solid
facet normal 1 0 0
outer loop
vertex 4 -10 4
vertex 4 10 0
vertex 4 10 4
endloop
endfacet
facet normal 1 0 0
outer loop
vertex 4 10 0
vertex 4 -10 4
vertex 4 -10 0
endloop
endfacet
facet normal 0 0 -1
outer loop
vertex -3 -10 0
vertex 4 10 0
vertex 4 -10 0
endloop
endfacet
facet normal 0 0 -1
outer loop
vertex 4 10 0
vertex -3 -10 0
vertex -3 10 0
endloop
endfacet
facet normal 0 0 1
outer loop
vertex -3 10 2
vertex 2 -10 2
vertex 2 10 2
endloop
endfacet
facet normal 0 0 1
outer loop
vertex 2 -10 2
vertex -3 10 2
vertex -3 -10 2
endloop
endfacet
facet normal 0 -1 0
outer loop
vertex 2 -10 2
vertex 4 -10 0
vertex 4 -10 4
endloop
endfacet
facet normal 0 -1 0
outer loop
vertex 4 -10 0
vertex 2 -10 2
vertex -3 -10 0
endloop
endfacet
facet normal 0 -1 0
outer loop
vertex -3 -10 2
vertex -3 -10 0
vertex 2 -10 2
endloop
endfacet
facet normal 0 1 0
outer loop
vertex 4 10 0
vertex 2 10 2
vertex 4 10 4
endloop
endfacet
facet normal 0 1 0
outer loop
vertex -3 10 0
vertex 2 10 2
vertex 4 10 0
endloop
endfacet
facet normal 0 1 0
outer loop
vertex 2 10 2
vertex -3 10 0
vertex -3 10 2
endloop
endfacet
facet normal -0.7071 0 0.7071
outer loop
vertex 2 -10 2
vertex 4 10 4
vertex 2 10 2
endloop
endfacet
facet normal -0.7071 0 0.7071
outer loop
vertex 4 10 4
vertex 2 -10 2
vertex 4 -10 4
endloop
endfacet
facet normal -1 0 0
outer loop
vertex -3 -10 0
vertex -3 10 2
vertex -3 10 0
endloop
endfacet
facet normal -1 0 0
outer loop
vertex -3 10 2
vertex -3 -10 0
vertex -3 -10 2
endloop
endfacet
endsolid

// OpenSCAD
module clip_holder(depth = 20, wall_thickness = 2, tolerance = 0.2) {
    // hanger
    translate([0, 0, -wall_thickness]) {
      cube(size=[wall_thickness * 1.5, depth, wall_thickness]);
    }
  
    translate([wall_thickness * 0.5, 0, 0]) {
      // clip
      translate([0, 0, -wall_thickness*2]) {
        translate([0, depth, 0]) {
          rotate(90, [1, 0, 0]) {
            linear_extrude(height=depth) {
                polygon(points=[[wall_thickness,0],[0, wall_thickness],[wall_thickness,wall_thickness]], paths=[[0,1,2]]);
            }
          }
        }
      }
    }
}

module clip_holder_mount_notches(depth = 20, height = 10, wall_thickness = 2, tolerance = 0.2) {
  union() {
    // right
    translate([wall_thickness, 0, -height / 2]) {
      rotate(45, [0, 0, 1]) {
        cube(size=[wall_thickness + tolerance, wall_thickness + tolerance, height + 0.2], center=true);
      }
    }

    // left
    translate([wall_thickness, depth, -height / 2]) {
      rotate(45, [0, 0, 1]) {
        cube(size=[wall_thickness + tolerance, wall_thickness + tolerance, height + 0.2], center=true);
      }
    }

    // bottom
    translate([wall_thickness, depth / 2, -height]) {
      rotate(45, [0, 1, 0]) {
        cube(size=[wall_thickness + tolerance, depth + 0.2, wall_thickness + tolerance], center=true);
      }
    }
  }
}


module clip_holder_mount(depth = 20, height = 10, wall_thickness = 2) {
  translate([0, 0, -height]) {
    cube(size=[(wall_thickness + wall_thickness), depth, height]);
  }
}

module wall_mounted_clip_holder (depth = 20, height = 10, wall_thickness = 2, tolerance = 0.2) {
  translate([-wall_thickness * 1.5, -depth / 2, 0]) {
    difference() {
      union() {
        clip_holder_mount(depth, height, wall_thickness);
        translate([wall_thickness * 2, 0, 0]) {
          clip_holder(depth, wall_thickness, tolerance);
        }
      }

      clip_holder_mount_notches(depth, height, wall_thickness, tolerance);
    }
  }
}

module base_mounted_clip_holder (depth = 20, wall_thickness = 2, tolerance = 0.2) {
  translate([-wall_thickness * 1.5, depth / 2, 0]) {
    rotate(180, [1, 0, 0]) {
      union() {
        clip_holder_mount(depth, wall_thickness, wall_thickness);
        translate([wall_thickness * 2, 0, 0]) {
          clip_holder(depth, wall_thickness, tolerance);
        }
      }  
    }
  }
}

module wall_mount_hole (depth = 20, height = 10, wall_thickness = 2, tolerance = 0.2) {

  translate([-wall_thickness * 1.5, -depth / 2, tolerance]) {
    difference() {
      union() {
        clip_holder_mount(depth, height + tolerance, wall_thickness);
      }

      clip_holder_mount_notches(depth, height, wall_thickness, 0);
    }
  }
}

module wall_mounted_stopper (depth = 20, height = 10, wall_thickness = 2, tolerance = 0.2) {
  translate([0, -depth / 2, 0]) {
    baseThickness = wall_thickness + tolerance * 2;
    baseHeight = wall_thickness * 2;
  
    translate([-tolerance, 0, 0]) {
      rotate(-90, [1, 0, 0]) {
        linear_extrude(height=depth) {
            polygon(points=[[0,0],[0, baseHeight],[baseThickness, 0]], paths=[[0,1,2]]);
        }
      }  
    }
  
    translate([tolerance, 0, 0]) {
      cube(size=[wall_thickness, depth, wall_thickness]);
    }
  }
}

module clip(depth = 10, height = 10, wall_thickness = 2, tolerance = 0.2) {
  full_height = wall_thickness * 6 + tolerance * 4;
 
  translate([0, -depth/2, -full_height / 2]) {
    cube(size=[wall_thickness, depth, full_height]);
  
    translate([wall_thickness/2 + tolerance, 0, 0]) {
      translate([0, 0, full_height]) {
        clip_holder(depth, wall_thickness, tolerance);
      }

      translate([wall_thickness * 1.5, 0, 0]) {
        cube(size=[wall_thickness / 2 - tolerance, depth, wall_thickness * 2]); 
      }

      translate([wall_thickness * 1.5, 0, full_height - wall_thickness * 2]) {
        cube(size=[wall_thickness / 2 - tolerance, depth, wall_thickness * 2]); 
      }
    
      translate([0, depth, 0]) {
        rotate(180, [1, 0, 0]) {
          clip_holder(depth,  wall_thickness, tolerance);
        }
      }
    }
  }
}


assembled = false;
rotationAngle = 0;

wall_thickness = 2;
tolerance = 0.2;
depth = 20;

// !clip(tolerance=tolerance, wall_thickness=wall_thickness, depth=depth);
// !clip_holder_mount(depth=depth, wall_thickness=wall_thickness, tolerance=tolerance);
// !wall_mounted_clip_holder(depth=depth, wall_thickness=wall_thickness, tolerance=tolerance);
// !wall_mounted_stopper(depth=depth, wall_thickness=wall_thickness, tolerance=tolerance);
// !wall_mount_hole(depth=depth, wall_thickness=wall_thickness, tolerance=tolerance);
!base_mounted_clip_holder(depth=depth, wall_thickness=wall_thickness, tolerance=tolerance);

if (assembled) {
  wall_mounted_clip_holder(tolerance=tolerance, wall_thickness=wall_thickness, depth=depth);
  
  translate([0, 0, 0]) {
    rotate(180, [1, 0, 0]) {
      wall_mounted_clip_holder(tolerance=tolerance, wall_thickness=wall_thickness, depth=depth);
    }
  }
  
  translate([wall_thickness * 4.5 + tolerance, 0, 0]) {
    rotate(180, [0, 1, 0]) {
      clip(tolerance=tolerance, wall_thickness=wall_thickness, depth=depth);
    }
  }
} else {
  rotate(-1 * rotationAngle, [0, 1, 0]) {
    wall_mounted_clip_holder(tolerance=tolerance, wall_thickness=wall_thickness, depth=depth);  
  }

  translate([0, depth * 1.5, wall_thickness * 2 + tolerance]) {
    rotate(rotationAngle, [0, 1, 0]) {
      clip(tolerance=tolerance, wall_thickness=wall_thickness, depth=depth);
    }  
  }
}
